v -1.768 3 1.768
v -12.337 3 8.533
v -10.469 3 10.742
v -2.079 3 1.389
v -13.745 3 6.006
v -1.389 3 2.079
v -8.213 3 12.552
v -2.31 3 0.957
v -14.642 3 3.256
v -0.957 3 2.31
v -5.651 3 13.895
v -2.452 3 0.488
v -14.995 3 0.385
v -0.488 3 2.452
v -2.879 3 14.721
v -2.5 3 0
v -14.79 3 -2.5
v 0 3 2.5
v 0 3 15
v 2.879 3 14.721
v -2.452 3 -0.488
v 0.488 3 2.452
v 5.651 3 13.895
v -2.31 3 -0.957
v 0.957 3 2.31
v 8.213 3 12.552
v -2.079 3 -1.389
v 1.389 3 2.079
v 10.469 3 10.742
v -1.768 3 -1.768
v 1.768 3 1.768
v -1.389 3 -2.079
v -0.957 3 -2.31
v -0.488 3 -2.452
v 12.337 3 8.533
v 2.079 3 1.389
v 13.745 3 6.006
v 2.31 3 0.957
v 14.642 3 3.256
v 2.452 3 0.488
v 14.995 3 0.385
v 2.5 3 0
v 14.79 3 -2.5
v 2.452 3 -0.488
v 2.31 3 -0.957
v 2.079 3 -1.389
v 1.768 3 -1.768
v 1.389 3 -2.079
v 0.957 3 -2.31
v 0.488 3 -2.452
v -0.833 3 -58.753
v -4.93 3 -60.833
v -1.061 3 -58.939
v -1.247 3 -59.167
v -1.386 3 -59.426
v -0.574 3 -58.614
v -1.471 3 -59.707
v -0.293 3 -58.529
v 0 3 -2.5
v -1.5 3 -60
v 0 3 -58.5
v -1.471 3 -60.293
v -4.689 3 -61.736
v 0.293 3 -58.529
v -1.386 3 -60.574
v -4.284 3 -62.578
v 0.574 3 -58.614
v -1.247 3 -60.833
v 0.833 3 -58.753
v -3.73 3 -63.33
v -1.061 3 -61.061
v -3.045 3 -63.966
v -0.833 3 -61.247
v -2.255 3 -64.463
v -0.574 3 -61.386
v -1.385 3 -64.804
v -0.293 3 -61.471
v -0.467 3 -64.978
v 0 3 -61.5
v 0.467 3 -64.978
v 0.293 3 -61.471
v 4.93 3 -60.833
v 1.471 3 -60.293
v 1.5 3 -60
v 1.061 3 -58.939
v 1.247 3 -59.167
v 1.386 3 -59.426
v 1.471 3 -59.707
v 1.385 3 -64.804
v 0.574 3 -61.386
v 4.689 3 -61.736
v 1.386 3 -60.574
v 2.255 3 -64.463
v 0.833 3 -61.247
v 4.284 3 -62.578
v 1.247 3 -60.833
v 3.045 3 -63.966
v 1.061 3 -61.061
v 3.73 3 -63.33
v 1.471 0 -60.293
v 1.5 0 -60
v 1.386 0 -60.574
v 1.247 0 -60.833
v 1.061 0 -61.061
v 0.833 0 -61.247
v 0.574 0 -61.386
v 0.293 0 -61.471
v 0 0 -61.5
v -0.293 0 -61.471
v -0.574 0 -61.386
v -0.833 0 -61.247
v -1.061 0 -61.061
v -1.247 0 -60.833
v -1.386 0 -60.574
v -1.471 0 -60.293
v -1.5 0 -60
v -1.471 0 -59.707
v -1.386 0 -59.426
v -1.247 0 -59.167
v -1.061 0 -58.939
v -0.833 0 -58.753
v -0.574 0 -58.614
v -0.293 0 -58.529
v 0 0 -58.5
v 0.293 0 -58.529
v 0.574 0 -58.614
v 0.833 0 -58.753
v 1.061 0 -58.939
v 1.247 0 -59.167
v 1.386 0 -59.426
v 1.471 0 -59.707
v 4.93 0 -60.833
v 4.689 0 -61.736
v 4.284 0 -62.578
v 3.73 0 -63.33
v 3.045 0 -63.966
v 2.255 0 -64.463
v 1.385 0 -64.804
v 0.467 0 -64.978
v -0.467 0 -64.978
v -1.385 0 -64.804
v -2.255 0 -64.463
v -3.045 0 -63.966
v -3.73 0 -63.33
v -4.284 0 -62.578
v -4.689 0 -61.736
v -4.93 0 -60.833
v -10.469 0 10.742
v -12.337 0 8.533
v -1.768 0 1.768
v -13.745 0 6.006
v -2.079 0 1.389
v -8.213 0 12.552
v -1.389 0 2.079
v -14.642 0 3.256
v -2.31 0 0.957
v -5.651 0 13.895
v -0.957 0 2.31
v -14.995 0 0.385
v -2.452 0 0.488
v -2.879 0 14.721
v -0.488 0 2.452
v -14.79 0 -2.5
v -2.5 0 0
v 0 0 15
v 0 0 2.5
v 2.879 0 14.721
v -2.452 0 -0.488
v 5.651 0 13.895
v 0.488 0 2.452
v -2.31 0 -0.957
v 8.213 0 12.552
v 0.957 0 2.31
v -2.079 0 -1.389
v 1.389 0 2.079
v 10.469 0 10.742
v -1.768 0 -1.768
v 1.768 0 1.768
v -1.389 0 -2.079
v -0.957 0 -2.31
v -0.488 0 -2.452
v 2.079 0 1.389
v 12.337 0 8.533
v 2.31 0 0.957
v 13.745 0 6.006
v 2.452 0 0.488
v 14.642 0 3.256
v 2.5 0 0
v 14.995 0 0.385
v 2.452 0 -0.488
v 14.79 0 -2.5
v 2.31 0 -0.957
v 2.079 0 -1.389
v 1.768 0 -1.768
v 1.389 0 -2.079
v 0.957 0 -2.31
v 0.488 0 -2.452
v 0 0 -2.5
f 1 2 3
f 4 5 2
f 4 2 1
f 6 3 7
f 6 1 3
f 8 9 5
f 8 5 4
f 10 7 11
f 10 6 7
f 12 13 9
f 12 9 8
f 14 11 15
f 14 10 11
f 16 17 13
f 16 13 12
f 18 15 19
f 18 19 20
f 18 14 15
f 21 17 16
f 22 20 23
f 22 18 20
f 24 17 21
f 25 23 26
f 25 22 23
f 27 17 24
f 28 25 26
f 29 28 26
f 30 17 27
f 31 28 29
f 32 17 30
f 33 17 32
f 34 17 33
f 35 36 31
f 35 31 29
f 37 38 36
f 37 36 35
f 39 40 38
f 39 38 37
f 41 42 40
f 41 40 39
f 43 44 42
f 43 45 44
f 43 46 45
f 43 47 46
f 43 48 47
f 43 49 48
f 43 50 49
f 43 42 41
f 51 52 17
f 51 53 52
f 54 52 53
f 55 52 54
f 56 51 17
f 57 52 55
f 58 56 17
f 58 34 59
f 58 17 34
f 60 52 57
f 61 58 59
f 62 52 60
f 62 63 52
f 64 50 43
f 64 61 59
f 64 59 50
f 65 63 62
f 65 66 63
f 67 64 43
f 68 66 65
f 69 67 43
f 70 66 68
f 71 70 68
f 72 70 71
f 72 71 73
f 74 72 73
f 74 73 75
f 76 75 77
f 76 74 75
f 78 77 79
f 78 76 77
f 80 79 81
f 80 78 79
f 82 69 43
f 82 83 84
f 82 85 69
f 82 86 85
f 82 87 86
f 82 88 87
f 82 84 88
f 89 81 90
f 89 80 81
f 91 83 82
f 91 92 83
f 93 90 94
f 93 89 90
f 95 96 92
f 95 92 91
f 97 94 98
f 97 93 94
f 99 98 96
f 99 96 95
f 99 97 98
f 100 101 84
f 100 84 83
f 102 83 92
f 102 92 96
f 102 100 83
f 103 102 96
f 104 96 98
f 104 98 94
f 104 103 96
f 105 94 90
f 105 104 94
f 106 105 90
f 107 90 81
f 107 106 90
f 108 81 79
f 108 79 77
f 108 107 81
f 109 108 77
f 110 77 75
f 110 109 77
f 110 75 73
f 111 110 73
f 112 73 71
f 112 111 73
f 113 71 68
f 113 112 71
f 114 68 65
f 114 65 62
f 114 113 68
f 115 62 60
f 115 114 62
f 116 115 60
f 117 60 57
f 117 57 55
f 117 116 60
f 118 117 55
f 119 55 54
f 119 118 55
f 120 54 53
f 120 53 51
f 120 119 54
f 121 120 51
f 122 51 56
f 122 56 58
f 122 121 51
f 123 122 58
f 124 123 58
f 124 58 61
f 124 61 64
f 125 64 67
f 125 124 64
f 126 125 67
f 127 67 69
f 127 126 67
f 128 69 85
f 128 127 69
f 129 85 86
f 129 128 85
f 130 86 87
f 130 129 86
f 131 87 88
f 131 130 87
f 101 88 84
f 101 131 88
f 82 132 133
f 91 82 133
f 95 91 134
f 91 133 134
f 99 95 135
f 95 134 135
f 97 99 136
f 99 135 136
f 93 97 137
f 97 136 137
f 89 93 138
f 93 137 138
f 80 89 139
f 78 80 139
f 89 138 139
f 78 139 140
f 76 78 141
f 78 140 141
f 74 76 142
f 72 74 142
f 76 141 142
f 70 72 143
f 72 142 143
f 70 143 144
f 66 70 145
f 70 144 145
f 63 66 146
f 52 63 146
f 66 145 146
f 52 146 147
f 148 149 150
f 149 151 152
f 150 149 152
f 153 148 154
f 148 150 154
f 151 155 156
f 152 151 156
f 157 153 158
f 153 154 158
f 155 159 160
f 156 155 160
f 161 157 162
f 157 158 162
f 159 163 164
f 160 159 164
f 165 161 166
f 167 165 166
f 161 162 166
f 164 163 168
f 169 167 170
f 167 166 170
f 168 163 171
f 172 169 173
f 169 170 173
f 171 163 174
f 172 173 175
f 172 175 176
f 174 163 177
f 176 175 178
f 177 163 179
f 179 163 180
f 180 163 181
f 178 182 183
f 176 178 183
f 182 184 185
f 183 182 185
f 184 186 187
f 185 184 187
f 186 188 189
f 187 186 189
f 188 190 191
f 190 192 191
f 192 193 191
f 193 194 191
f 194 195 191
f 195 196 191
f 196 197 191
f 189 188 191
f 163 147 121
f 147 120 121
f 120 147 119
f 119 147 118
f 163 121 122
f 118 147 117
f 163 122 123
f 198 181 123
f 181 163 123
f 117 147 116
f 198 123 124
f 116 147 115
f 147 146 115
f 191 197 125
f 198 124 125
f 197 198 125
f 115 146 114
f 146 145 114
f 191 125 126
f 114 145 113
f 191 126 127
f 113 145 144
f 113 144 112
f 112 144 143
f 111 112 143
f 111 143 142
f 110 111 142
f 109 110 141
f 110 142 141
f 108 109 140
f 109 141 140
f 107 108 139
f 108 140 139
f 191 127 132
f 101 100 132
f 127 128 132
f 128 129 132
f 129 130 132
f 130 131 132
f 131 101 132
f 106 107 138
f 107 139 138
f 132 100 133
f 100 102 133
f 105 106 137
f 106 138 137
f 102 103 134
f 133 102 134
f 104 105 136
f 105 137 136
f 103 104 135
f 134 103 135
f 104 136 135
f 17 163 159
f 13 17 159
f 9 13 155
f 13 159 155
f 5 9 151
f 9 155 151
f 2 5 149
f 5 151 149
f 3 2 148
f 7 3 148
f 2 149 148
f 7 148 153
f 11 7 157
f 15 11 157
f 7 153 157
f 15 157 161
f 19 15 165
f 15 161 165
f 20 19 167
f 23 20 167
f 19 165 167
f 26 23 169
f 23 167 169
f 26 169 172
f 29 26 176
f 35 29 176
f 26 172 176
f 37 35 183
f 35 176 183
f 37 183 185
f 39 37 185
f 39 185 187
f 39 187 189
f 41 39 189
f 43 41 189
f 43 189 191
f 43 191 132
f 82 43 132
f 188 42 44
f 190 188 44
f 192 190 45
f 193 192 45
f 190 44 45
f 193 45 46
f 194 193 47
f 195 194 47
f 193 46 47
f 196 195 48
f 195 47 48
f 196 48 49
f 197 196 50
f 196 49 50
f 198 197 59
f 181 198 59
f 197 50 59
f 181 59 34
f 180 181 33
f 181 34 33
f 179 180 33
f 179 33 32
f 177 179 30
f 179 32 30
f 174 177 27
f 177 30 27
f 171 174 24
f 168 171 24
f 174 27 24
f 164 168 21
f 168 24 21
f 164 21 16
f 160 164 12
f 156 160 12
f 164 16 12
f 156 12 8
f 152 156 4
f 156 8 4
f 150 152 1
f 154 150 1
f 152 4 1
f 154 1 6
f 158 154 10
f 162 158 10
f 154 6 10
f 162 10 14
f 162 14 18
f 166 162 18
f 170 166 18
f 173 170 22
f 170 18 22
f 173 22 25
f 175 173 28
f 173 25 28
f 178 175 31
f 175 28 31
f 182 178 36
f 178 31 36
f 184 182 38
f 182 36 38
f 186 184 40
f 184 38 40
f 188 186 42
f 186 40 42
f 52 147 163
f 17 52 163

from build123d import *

# Parameters (mm, degrees)
SKETCH1_R           = 1.5
BOSS_EXTRUDE1_DEPTH = 3
SKETCH2_R           = 2.5
CUT_EXTRUDE1_DEPTH  = 3


with BuildPart() as part:
    # Sketch1 → Boss-Extrude1 (new body)
    with BuildSketch(Plane(origin=(0, 0, 0), x_dir=(1, 0, 0), z_dir=(0, 1, 0))):
        with BuildLine():
            Line((-4.930066486, 60.833333333), (-14.790199458, 2.5))
            ThreePointArc((-14.790199458, 2.5), (0, -15), (14.790199458, 2.5))
            Line((14.790199458, 2.5), (4.930066486, 60.833333333))
            ThreePointArc((4.930066486, 60.833333333), (0, 65), (-4.930066486, 60.833333333))
        make_face()
        with Locations((0, 60)):
            Circle(SKETCH1_R, mode=Mode.SUBTRACT)
    extrude(amount=BOSS_EXTRUDE1_DEPTH)

    # Sketch2 → Cut-Extrude1 (cut)
    with BuildSketch(Plane(origin=(0, 3, 0), x_dir=(1, 0, 0), z_dir=(0, 1, 0))):
        Circle(SKETCH2_R)
    extrude(amount=-CUT_EXTRUDE1_DEPTH, mode=Mode.SUBTRACT)


solid = part.part
